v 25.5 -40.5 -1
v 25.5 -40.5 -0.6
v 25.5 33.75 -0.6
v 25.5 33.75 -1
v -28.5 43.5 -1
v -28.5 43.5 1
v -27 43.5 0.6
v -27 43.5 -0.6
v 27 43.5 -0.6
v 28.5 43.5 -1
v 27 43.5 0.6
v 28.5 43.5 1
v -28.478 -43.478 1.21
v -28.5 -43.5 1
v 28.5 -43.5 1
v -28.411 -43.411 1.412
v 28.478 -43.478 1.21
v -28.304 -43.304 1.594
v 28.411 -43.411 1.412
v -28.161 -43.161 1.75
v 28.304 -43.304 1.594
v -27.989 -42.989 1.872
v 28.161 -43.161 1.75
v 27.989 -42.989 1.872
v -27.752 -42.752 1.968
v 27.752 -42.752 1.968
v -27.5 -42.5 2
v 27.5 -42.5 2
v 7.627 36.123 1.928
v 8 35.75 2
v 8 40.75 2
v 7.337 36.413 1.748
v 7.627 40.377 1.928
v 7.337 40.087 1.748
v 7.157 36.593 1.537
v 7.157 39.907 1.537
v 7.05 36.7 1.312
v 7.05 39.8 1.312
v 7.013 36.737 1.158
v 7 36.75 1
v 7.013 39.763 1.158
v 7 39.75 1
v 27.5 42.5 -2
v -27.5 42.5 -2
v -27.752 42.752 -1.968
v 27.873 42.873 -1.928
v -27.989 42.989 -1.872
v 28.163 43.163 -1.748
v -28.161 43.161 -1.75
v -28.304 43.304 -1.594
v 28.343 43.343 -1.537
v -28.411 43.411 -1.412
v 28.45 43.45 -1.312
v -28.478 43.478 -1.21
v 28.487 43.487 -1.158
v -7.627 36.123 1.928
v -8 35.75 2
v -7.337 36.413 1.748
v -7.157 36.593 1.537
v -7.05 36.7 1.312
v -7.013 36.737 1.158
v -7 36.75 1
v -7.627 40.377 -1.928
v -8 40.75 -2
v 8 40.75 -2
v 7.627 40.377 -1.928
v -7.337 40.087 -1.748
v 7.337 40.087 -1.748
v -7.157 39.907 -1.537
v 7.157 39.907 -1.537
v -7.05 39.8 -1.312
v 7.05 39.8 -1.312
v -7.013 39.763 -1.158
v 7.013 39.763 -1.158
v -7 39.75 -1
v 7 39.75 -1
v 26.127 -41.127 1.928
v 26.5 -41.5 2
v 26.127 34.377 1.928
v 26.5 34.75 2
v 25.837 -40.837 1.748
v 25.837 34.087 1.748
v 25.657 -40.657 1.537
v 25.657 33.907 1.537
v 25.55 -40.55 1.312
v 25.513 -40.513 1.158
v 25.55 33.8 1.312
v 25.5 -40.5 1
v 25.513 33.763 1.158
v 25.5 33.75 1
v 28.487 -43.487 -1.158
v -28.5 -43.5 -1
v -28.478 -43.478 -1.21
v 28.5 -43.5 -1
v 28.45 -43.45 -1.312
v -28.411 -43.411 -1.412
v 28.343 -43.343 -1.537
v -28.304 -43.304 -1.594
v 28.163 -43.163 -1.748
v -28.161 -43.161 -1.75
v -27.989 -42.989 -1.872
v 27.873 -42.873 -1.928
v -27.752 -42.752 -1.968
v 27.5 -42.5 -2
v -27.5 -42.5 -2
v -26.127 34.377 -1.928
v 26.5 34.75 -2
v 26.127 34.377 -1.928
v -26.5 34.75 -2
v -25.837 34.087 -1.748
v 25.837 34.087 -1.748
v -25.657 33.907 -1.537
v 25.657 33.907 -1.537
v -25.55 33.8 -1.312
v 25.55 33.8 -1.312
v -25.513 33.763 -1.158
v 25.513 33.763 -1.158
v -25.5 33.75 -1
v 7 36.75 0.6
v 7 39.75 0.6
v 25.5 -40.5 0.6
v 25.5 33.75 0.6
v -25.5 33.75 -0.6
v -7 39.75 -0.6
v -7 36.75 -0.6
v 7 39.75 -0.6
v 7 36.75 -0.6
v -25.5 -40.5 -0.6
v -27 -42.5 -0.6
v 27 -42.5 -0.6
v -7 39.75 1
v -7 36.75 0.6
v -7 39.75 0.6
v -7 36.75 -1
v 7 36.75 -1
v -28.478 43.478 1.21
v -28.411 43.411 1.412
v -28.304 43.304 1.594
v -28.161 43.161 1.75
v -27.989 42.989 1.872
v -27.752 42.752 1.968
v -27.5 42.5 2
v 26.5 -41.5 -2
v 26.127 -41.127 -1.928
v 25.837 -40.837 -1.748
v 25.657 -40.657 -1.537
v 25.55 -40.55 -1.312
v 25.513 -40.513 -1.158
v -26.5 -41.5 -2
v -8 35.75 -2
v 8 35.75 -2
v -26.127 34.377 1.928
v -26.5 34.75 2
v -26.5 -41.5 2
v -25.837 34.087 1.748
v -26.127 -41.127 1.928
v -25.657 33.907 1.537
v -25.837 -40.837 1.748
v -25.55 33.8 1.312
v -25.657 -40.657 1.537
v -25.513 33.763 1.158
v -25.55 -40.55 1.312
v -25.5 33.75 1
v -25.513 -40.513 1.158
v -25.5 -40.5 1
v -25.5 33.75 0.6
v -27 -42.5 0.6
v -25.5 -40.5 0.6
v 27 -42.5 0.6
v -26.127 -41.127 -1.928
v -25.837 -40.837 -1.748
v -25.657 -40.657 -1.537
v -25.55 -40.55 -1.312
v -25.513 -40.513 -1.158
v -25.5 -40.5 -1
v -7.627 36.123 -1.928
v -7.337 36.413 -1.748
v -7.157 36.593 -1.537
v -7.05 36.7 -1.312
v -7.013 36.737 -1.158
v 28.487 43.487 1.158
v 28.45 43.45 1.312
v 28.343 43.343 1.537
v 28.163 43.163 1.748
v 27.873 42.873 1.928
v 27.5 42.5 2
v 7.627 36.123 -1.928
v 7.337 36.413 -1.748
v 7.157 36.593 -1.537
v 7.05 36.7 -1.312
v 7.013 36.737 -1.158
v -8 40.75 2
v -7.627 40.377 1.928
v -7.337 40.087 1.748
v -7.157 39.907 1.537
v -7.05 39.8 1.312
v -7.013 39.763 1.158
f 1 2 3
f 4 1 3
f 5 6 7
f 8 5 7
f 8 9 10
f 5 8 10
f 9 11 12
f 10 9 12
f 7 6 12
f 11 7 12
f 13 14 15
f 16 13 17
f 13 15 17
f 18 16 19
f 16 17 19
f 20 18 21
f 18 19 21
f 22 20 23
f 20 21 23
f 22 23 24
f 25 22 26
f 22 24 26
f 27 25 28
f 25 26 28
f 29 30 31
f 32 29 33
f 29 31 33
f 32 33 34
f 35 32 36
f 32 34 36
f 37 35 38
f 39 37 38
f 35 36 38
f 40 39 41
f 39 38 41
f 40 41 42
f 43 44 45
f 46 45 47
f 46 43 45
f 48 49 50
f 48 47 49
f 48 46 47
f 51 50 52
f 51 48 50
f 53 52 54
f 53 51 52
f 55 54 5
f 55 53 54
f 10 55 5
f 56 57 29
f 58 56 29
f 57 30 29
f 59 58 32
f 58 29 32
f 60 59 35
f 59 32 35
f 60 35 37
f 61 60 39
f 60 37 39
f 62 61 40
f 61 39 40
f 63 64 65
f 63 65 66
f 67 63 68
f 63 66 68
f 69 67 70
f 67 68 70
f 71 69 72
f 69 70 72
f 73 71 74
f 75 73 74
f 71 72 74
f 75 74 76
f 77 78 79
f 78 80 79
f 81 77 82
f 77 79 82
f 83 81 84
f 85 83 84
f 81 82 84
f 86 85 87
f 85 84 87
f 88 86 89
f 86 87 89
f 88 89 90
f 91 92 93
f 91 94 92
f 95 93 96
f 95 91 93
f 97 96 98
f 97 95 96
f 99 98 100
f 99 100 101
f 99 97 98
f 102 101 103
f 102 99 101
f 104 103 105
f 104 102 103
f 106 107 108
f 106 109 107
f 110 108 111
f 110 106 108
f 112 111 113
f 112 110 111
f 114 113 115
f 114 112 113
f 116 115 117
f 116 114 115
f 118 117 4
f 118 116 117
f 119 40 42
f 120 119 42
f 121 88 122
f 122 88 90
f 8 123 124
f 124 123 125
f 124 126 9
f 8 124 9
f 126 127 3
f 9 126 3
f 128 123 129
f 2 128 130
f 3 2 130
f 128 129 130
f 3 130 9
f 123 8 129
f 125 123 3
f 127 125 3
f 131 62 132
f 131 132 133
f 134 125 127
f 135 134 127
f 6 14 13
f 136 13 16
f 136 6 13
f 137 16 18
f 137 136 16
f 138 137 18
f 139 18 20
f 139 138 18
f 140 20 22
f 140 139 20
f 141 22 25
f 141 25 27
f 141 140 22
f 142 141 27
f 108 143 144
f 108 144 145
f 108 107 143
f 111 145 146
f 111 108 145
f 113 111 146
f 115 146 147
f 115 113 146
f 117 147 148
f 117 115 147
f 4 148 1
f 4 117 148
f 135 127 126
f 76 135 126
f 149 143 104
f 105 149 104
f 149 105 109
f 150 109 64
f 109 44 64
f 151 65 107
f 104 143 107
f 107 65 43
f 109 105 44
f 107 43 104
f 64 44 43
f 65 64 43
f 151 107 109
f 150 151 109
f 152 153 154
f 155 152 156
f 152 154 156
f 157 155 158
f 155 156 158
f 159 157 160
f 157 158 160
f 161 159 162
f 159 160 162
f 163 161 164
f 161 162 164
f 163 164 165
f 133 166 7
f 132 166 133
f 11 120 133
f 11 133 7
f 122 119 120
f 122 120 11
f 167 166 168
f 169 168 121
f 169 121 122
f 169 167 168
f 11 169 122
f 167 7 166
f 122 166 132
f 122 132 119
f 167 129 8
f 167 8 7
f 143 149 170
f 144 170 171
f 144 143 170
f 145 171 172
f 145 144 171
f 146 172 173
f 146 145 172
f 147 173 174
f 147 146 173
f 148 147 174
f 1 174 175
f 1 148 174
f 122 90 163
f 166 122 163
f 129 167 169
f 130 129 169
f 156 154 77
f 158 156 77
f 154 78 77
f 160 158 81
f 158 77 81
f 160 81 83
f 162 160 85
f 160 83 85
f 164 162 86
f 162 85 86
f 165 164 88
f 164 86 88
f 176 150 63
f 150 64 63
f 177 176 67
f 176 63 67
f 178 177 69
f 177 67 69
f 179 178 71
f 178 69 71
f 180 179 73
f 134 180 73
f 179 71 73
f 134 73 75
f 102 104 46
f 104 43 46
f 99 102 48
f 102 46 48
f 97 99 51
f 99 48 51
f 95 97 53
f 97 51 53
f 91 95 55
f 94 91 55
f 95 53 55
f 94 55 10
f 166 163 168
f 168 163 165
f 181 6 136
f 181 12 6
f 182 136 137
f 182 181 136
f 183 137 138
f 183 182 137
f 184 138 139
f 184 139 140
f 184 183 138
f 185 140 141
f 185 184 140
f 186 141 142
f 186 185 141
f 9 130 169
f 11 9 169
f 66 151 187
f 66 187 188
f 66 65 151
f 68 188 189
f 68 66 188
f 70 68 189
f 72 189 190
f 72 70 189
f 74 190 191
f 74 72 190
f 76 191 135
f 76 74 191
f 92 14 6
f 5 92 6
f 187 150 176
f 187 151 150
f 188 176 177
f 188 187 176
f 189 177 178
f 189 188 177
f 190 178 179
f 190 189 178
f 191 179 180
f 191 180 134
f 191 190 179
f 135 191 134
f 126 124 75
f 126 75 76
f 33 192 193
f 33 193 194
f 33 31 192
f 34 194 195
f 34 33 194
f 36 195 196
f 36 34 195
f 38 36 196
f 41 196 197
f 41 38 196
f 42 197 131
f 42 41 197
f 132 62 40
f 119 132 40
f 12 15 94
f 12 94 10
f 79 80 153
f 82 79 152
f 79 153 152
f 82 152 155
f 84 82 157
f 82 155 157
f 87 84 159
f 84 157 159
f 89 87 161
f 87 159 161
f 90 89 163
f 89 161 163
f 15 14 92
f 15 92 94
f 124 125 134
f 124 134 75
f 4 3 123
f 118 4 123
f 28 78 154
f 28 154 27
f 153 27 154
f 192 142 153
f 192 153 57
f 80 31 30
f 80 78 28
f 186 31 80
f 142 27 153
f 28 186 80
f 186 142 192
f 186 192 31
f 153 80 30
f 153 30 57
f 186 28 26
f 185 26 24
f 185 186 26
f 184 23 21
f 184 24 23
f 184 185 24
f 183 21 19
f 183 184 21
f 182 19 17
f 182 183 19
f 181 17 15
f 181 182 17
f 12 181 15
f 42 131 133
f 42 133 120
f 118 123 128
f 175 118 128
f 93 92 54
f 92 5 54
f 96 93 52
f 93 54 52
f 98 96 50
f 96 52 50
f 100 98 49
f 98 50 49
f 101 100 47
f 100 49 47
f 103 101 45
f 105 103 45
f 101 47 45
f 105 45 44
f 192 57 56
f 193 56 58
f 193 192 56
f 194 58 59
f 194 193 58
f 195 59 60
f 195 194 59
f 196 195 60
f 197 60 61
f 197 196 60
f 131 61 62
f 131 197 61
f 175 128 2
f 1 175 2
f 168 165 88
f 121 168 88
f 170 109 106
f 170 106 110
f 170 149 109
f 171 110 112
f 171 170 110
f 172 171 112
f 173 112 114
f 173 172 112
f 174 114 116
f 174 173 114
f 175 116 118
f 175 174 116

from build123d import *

# Parameters (mm, degrees)
F0_W          = 57
F0_H          = 87
F1_DEPTH      = 2
F2_W          = 14
F2_H          = 3
F3_DEPTH      = 12.5
F4_W          = 54
F4_H          = 1.2
F5_DEPTH      = 50
F5_DEPTH_BACK = 42.5
F6_W          = 25.5
F6_H          = 33.75
F6_H_2        = 40.5
F7_DEPTH      = 12.5
F8_R          = 1


with BuildPart() as f1:
    # F0 (on Top) → F1 (new body, symmetric)
    with BuildSketch(Plane.XY):
        Rectangle(F0_W, F0_H)
    extrude(amount=F1_DEPTH, both=True)

    # F2 (on Top) → F3 (cut, symmetric)
    with BuildSketch(Plane.XY):
        with Locations((0, 38.25)):
            Rectangle(F2_W, F2_H)
    extrude(amount=F3_DEPTH, both=True, mode=Mode.SUBTRACT)

    # F4 (on Front) → F5 (cut, two sides)
    with BuildSketch(Plane.XZ) as f5_sk:
        Rectangle(F4_W, F4_H)
    extrude(amount=-F5_DEPTH, mode=Mode.SUBTRACT)
    extrude(f5_sk.sketch, amount=F5_DEPTH_BACK, mode=Mode.SUBTRACT)

    # F6 (on Top) → F7 (cut, symmetric)
    with BuildSketch(Plane.XY):
        with Locations((12.75, 16.875)):
            Rectangle(F6_W, F6_H)
        with Locations((-12.75, 16.875)):
            Rectangle(F6_W, F6_H)
        with Locations((12.75, -20.25)):
            Rectangle(F6_W, F6_H_2)
        with Locations((-12.75, -20.25)):
            Rectangle(F6_W, F6_H_2)
    extrude(amount=F7_DEPTH, both=True, mode=Mode.SUBTRACT)

    # F8
    f8_edges = [f1.edges().sort_by_distance(p)[0] for p in [
        (-28.5, 0, 2),
        (-25.5, -3.375, 2),
        (0, -40.5, 2),
        (0, -43.5, 2),
        (25.5, -3.375, 2),
        (28.5, 0, 2),
        (0, 33.75, 2),
        (0, 43.5, 2),
        (-28.5, 0, -2),
        (0, 43.5, -2),
        (0, 33.75, -2),
        (25.5, -3.375, -2),
        (-25.5, -3.375, -2),
        (28.5, 0, -2),
        (0, -40.5, -2),
        (0, 36.75, -2),
        (7, 38.25, -2),
        (-7, 38.25, -2),
        (0, 39.75, -2),
        (0, 36.75, 2),
        (-7, 38.25, 2),
        (7, 38.25, 2),
        (0, -43.5, -2),
        (0, 39.75, 2),
    ]]
    fillet(f8_edges, radius=F8_R)


solid = f1.part
